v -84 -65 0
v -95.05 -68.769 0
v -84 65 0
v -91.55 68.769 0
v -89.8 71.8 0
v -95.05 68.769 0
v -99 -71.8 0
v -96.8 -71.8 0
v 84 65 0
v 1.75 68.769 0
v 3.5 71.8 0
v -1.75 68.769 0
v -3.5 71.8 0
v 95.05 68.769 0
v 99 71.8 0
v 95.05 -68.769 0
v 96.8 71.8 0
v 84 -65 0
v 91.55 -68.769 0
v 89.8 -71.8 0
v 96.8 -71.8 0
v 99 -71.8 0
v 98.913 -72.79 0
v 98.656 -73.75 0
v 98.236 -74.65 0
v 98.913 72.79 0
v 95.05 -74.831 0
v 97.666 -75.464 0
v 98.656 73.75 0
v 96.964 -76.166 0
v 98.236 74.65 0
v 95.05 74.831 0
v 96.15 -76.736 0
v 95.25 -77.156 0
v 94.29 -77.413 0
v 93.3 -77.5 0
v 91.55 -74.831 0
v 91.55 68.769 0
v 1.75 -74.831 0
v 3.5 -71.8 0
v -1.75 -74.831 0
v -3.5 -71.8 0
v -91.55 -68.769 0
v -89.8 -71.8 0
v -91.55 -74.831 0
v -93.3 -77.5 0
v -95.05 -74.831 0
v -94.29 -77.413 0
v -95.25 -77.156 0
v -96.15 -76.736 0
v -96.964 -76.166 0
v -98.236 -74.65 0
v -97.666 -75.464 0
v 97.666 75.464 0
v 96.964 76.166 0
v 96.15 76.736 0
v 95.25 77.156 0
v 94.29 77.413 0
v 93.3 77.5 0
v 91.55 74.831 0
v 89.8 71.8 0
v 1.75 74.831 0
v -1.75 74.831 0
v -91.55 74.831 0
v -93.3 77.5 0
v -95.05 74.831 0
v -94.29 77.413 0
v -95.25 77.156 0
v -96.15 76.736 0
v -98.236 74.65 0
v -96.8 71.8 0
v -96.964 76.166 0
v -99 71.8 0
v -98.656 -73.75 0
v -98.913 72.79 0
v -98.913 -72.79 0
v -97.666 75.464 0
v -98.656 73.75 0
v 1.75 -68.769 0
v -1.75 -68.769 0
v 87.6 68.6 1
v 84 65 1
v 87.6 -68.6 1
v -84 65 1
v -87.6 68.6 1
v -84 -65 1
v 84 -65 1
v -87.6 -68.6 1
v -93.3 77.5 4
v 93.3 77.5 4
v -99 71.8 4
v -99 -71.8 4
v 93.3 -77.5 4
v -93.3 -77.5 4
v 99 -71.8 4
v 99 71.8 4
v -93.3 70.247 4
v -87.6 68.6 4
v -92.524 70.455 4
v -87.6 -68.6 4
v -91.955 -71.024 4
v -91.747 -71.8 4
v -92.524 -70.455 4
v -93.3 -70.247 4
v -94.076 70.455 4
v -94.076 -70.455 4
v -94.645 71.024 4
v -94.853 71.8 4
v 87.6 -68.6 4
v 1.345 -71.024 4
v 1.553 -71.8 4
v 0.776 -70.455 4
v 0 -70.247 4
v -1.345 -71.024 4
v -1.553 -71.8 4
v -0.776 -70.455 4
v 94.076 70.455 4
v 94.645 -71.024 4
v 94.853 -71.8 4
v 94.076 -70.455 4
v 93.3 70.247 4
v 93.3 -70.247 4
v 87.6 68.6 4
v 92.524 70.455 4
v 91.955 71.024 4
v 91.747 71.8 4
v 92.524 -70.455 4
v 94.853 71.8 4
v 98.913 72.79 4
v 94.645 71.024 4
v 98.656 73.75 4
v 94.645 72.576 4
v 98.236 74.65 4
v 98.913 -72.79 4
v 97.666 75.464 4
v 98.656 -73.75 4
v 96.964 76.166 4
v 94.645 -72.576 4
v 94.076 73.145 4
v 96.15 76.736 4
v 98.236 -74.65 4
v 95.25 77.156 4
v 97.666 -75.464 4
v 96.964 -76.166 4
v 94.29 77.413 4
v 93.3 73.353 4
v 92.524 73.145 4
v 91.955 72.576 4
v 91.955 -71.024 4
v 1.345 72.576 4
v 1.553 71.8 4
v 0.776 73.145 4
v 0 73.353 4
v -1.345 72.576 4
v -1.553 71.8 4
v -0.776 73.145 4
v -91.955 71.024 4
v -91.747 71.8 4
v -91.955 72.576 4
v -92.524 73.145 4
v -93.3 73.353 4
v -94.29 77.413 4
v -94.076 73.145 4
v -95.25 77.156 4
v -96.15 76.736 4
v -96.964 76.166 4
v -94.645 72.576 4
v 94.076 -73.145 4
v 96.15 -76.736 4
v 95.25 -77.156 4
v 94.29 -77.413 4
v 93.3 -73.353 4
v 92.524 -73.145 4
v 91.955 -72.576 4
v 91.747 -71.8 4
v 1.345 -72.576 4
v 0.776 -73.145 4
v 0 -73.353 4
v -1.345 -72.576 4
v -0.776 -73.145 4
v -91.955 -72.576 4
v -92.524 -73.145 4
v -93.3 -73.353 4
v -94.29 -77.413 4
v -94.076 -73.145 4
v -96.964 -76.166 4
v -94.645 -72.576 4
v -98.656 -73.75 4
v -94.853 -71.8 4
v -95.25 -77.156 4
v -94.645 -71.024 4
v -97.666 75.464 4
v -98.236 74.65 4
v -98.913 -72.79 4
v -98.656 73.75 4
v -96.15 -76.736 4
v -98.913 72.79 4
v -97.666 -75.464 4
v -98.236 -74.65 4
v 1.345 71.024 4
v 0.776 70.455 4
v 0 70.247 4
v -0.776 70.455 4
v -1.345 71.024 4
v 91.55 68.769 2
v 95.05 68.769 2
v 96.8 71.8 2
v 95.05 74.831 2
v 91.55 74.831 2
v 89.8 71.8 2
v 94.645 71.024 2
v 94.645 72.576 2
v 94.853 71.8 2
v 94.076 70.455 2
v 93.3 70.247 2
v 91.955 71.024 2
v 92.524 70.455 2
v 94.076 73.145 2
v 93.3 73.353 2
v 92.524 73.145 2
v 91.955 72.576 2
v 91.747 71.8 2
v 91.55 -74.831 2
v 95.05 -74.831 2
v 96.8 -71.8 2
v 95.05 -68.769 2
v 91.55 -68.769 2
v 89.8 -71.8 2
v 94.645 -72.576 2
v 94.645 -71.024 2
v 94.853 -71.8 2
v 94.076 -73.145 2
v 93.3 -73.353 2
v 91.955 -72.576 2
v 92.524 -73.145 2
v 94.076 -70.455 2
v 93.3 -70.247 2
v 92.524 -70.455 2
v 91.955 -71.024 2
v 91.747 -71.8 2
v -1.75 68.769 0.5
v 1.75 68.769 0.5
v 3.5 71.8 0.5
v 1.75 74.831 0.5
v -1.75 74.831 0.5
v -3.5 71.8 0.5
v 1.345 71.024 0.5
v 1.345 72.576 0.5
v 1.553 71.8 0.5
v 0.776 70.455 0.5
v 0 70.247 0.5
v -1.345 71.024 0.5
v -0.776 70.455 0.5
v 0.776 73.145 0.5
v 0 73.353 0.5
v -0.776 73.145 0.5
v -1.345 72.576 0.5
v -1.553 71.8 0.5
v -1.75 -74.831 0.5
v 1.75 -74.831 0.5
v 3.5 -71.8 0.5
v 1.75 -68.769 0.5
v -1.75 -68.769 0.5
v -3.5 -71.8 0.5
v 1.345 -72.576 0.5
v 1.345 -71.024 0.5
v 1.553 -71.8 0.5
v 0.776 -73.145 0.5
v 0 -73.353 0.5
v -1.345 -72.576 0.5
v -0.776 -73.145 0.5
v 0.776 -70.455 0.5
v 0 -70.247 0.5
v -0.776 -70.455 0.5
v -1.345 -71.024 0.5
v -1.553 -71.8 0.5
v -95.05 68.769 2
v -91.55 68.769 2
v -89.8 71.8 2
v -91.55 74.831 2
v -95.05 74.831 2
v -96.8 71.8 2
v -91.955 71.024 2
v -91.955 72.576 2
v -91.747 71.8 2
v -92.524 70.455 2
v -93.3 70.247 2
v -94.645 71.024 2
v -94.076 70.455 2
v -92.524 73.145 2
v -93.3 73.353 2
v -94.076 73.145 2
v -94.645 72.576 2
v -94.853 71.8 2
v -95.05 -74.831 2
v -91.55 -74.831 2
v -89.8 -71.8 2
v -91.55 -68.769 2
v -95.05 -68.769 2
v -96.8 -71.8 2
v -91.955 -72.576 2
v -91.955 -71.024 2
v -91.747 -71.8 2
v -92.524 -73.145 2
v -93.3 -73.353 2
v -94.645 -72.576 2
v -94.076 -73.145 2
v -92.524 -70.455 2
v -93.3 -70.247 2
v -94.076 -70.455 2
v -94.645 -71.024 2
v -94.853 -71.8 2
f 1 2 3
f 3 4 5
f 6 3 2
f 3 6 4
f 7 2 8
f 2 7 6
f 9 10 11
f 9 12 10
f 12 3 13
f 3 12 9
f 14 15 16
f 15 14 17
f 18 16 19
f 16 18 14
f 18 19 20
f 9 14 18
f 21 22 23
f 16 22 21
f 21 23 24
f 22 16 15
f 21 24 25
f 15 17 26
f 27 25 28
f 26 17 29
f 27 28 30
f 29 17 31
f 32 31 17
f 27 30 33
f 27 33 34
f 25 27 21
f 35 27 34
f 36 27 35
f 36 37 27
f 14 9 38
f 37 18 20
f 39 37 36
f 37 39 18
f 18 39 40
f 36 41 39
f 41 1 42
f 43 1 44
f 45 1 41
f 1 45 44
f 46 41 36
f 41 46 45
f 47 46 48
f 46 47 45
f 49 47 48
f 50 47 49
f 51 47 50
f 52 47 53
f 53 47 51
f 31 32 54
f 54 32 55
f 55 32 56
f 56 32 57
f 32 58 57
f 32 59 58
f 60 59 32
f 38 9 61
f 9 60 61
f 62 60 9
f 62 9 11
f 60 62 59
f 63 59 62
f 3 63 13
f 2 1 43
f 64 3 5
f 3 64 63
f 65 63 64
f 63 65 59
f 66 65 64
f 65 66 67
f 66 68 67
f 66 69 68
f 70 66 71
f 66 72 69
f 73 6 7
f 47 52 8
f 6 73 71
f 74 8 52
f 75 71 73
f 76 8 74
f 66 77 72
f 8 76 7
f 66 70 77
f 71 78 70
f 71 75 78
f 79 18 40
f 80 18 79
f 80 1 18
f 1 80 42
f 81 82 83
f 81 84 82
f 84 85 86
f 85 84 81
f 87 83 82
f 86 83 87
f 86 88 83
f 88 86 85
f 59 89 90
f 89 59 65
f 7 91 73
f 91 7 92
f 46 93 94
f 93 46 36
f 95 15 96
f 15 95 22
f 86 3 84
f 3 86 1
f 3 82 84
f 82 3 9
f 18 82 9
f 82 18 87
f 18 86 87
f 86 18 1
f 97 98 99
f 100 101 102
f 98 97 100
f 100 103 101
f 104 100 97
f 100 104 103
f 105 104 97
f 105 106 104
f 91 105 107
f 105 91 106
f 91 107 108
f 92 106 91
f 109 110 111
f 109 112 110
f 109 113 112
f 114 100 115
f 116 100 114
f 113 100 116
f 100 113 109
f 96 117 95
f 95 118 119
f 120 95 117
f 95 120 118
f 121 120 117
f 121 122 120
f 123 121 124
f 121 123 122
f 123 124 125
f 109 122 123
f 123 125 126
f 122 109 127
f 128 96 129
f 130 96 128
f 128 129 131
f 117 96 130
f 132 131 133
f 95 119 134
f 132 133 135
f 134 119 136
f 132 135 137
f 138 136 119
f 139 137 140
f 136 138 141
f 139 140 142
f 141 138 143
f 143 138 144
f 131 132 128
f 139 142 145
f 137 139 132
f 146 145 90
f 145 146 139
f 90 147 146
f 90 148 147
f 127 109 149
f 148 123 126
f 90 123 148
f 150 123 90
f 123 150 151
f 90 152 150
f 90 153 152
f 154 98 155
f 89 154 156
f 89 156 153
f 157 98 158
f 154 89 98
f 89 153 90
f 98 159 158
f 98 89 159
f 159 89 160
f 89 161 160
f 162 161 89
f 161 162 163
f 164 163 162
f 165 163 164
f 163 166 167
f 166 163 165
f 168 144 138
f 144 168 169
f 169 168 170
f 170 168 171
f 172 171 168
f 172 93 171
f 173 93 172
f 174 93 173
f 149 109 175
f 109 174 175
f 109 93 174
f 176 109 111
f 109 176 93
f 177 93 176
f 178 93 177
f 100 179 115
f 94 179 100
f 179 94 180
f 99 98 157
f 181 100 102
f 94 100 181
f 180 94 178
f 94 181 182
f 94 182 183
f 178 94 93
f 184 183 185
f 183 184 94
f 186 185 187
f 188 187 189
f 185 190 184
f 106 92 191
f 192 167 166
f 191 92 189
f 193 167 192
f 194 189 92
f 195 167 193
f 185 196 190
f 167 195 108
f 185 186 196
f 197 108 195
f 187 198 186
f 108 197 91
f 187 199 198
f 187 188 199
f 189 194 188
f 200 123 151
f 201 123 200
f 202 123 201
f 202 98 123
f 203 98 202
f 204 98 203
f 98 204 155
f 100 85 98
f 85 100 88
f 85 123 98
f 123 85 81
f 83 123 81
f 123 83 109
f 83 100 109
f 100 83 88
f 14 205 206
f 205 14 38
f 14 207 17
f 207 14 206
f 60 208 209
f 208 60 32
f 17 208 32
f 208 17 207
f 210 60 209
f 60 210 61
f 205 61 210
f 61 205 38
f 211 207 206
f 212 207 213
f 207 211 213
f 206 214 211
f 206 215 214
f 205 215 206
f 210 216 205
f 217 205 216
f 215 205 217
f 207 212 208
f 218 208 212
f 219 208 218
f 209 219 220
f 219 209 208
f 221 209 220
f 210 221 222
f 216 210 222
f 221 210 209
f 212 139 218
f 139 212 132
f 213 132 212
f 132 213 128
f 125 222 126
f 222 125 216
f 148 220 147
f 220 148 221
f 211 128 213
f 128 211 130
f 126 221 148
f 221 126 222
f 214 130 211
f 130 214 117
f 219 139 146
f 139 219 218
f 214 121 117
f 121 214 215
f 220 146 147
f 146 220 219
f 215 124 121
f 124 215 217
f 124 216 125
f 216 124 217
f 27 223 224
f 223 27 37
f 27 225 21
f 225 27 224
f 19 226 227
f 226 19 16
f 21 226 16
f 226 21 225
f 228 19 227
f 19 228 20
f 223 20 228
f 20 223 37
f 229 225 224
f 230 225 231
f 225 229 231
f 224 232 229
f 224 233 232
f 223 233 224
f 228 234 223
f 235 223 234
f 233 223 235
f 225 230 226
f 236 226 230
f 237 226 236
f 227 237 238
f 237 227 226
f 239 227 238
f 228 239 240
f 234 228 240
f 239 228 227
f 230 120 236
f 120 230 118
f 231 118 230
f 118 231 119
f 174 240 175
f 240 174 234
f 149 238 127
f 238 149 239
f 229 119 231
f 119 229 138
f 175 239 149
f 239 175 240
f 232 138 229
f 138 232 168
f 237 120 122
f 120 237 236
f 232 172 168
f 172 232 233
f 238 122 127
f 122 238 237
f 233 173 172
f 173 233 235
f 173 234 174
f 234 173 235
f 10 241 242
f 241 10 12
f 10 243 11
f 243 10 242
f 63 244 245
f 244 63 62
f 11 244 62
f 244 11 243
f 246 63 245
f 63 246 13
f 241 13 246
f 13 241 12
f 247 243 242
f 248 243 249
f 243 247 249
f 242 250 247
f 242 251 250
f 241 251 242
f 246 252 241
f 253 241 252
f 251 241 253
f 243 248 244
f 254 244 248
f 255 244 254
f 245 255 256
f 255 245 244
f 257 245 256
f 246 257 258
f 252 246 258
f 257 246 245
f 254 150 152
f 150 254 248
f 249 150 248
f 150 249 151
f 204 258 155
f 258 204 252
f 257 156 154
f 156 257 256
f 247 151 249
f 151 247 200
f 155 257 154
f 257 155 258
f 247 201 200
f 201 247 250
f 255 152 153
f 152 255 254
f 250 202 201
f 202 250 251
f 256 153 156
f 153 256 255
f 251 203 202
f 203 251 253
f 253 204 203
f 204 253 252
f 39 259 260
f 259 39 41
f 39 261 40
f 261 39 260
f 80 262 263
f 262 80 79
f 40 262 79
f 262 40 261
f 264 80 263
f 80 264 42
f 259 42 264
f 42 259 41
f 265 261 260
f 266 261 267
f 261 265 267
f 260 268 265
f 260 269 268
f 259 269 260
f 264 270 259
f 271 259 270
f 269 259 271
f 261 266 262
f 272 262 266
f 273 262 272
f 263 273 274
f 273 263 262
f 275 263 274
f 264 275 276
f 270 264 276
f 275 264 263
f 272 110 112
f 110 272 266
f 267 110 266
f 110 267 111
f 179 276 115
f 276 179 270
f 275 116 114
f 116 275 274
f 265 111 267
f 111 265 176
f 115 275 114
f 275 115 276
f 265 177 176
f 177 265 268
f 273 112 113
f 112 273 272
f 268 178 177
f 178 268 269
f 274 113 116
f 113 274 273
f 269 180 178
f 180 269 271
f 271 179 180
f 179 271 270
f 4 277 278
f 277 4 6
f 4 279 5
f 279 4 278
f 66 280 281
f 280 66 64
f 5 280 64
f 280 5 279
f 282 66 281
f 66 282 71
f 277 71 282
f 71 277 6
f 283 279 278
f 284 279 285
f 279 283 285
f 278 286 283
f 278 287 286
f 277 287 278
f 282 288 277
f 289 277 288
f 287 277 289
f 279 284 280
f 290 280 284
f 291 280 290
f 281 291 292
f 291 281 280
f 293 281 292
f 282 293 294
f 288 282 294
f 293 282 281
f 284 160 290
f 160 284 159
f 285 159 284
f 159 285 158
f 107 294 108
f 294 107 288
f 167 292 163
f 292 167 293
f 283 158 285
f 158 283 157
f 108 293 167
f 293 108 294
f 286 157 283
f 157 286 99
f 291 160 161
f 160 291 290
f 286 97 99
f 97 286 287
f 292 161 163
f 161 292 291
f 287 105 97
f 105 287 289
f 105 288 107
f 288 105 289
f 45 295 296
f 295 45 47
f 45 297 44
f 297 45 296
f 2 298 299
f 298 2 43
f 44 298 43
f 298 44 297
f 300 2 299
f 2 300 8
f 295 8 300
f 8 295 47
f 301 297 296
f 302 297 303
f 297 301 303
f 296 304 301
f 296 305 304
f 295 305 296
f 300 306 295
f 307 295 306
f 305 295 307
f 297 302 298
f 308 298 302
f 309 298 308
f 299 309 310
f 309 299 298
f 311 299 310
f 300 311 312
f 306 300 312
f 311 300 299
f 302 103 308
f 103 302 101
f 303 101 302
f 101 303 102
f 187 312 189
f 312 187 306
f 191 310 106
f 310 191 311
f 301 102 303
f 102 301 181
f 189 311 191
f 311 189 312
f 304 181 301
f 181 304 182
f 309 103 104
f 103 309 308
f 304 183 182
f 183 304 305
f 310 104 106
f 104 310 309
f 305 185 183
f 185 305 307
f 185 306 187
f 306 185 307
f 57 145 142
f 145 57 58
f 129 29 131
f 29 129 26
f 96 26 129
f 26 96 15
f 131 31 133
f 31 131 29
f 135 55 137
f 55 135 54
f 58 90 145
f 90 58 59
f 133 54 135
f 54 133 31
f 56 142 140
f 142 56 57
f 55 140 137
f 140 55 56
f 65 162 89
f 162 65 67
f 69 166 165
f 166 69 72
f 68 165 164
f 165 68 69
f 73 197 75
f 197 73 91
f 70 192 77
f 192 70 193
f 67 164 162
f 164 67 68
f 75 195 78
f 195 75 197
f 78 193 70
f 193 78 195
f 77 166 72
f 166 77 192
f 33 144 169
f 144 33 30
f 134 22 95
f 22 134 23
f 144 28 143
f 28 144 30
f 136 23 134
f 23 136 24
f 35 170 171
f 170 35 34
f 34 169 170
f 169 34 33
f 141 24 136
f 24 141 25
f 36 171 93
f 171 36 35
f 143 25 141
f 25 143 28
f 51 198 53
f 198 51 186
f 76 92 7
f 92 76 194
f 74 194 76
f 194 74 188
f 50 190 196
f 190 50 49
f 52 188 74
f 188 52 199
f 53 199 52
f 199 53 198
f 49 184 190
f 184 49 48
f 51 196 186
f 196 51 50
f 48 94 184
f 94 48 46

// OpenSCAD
// PM8535 CRT to LCD screen adaptor
//
//
// an adaptor allowing the use of an LCD screen (default size is for 8 inch HE080IA-01E) in place
//   of the CRT in a Philips PM8535 Logic analyser. 

echo(version=version());

/* [Parts and display] */
// which part to export
part="front"; // [front, back, mounting]
// show facia and screen
show="all"; // [all, parts, none]
// bed width
bed_w = 220;

/* [VDU apature] */
// apature width
apature_w = 180;
// apature height
apature_h = 137;
// apature depth
apature_d = 25;
// amount overlaped behind apature
apature_o = 9;

/* [Mounting points] */
// mounting width
mount_w = 213;
//mounting height
mount_h = 160;
// mounting stud diameter (M4 thread with 7mm nut)
mount_d = 4;
// mounting stud base diameter
mount_base_d = 19;
// mount tab diameter
mount_tab_d = 10;


/* [LCD screen] */
// screen width
screen_w=174;
// screen height
screen_h=136;
// screen depth
screen_d=3;
// additional space between screen and mount
screen_e=0.6; 

/* [mount face] */
// amount the screen is overlapped by a border
face_o=3; 
// depth to LCD screen 
face_d=1; 

module __Customizer_Limit__ () {}


// calculated values
face_o2 = face_o * 2;
apature_o2 = apature_o * 2;
screen_e2 = screen_e * 2;

// standoff radius
standoff_r = ((apature_w + apature_o2) - (screen_w + screen_e2)) / 4;

// fixing bolts location
bolt_x = ((apature_w + apature_o2) / 2) - standoff_r;
bolt_y = ((apature_h + apature_o2) / 2) - standoff_r;
// fixing bolt length
bolt_l = 30;

facia_d = 10; //facia depth
facia_o2 = 20*2; // facia overlap


module cylinder_outer(height,radius,fn) {
   fudge = 1/cos(180/fn);
   cylinder(h=height,r=radius*fudge,$fn=fn);
}
   
module m3_hex_bolt(height) {
    translate([0,0,-0.1]) union() {
        cylinder(h=2.1, r=7/2, $fn=6); // hex head 5mm across flats 2mm high
        translate([0,0,2]) cylinder_outer(height+0.1, 3/2, 12);
    }
}


module bolt_pattern(x,y, l) {
    translate([ x,  y,    0]) m3_hex_bolt(l);
    translate([ x, -y,    0]) m3_hex_bolt(l);
    translate([ 0,  y, -1.5]) m3_hex_bolt(l);
    translate([ 0, -y, -1.5]) m3_hex_bolt(l);
    translate([-x,  y,    0]) m3_hex_bolt(l);
    translate([-x, -y,    0]) m3_hex_bolt(l);    
}

module prism(l, w, h) {
       translate([-l/2, 0, 0])
    polyhedron(
           points=[[0,0,0], [l,0,0], [l,w,0], [0,w,0], [0,0,h], [l,0,h]],
           faces=[[0,1,2,3],[5,4,3,2],[0,4,5,1],[0,3,4],[5,2,1]]
       );
}


module gusset(height, gusset_w, angle) {
    rotate([0,0,angle]) translate([0, gusset_w, 0]) prism(gusset_w, height, height);
}

module standoff(x, y, height, radius, gusset_w, fn) {
    hypot = pythag(2*x, 2*y);
    angle = asin((2*x)/(hypot));

    translate([x, y, 0]) {
        cylinder(h = height, r = radius, $fn=fn);
        if (x>0) {
            gusset(height, gusset_w, 90);
            if (y>0) {
                gusset(height, gusset_w, 180);
                gusset(height, gusset_w, 180-angle);
            } else {
                gusset(height, gusset_w, 0);
                gusset(height, gusset_w, angle);
            }
        } else if (x<0) {
            gusset(height, gusset_w, 270);
            if (y>0) {
                gusset(height, gusset_w, 180);
                gusset(height, gusset_w, 180-angle);
            } else {
                gusset(height, gusset_w, 0);
                gusset(height, gusset_w, angle);
            }
        } else {
            // centre post gussets
            gusset(height, gusset_w, 90);
            gusset(height, gusset_w, 270);
        }   
    }
}

module standoffs(x,y,height, radius, gusset_w, fn) {
    standoff( x,  y,height, radius, gusset_w, fn);
    standoff( x, -y,height, radius, gusset_w, fn);
    standoff( 0,  y,height, radius, gusset_w, fn);
    standoff( 0, -y,height, radius, gusset_w, fn);
    standoff(-x,  y,height, radius, gusset_w, fn);
    standoff(-x, -y,height, radius, gusset_w, fn);
}

module standoff_spacers(x,y,height, radius, fn) {
    translate([x, y, -(height/2)]) cube([radius*2.1,radius*2.1,height],center=true);
    translate([x, -y, -(height/2)]) cube([radius*2.1,radius*2.1,height],center=true);
    translate([-x, y, -(height/2)]) cube([radius*2.1,radius*2.1,height],center=true);
    translate([-x, -y, -(height/2)]) cube([radius*2.1,radius*2.1,height],center=true);
}

module mounting_stud(x, y, height, fn) {
    translate([ x,  y, 0])
        cylinder(h = apature_d - 0.1, r=mount_base_d/2, $fn=fn);
    translate([ x,  y, apature_d-0.1]) 
        cylinder(h = height + 0.1, r=mount_d/2, $fn=fn);
}

module mounting_studs(x,y,height) {
    mounting_stud(x,y, height, 36);
    mounting_stud(-x,y, height, 36);
    mounting_stud(x,-y, height, 36);
    mounting_stud(-x,-y, height, 36);
}

// mounting tab between standoff and mounting stud
// first coordinate is mounting stud, second is standoff
module mounting_tab(x1, y1, tab_r, hole_r, x2, y2, r2, fn) {
    difference() {
        hull() {
          translate([ x1, y1]) circle(r=tab_r, $fn=fn);
          translate([ x2, y2]) circle(r=r2, $fn=fn);
        }
        translate([ x1, y1]) circle(r=hole_r, $fn=fn);
    }
}

module mounting_tabs(x1,y1,tab_r,hole_r, x2,y2,r2, fn) {
    mounting_tab( x1,  y1, tab_r, hole_r,  x2,  y2, r2, fn);
    mounting_tab(-x1,  y1, tab_r, hole_r, -x2,  y2, r2, fn);
    mounting_tab( x1, -y1, tab_r, hole_r,  x2, -y2, r2, fn);
    mounting_tab(-x1, -y1, tab_r, hole_r, -x2, -y2, r2, fn);
}

module ribs(x,y,w,h) {
    translate([ x,  0, h/2]) cube([        w, y * 2 + w, h], center = true);
    translate([-x,  0, h/2]) cube([        w, y * 2 + w, h], center = true);
    translate([ 0,  y, h/2]) cube([x * 2 + w,         w, h], center = true);
    translate([ 0, -y, h/2]) cube([x * 2 + w,         w, h], center = true);
}

module face(h) {
    linear_extrude(height = h)
        difference() {
            square([apature_w + apature_o2, apature_h + apature_o2], center = true);
            square([    screen_w - face_o2, screen_h - face_o2    ], center = true);
        }
}

function pythag(x,y) = sqrt((x*x) + (y*y));

module cross_brace(x,y,r,w,h) {
    hypot = pythag(2*x, 2*y);
    angle = acos((2*x)/(hypot));
    translate([0,0,h/2]) rotate([0,0,angle]) cube([hypot, 2*r, h], center=true);
    translate([0,0,h/2]) rotate([0,0,-angle]) cube([hypot, 2*r, h], center=true);
    translate([0,0,h+h/2]) rotate([0,0,angle]) cube([hypot, w, h], center=true);
    translate([0,0,h+h/2]) rotate([0,0,-angle]) cube([hypot, w, h], center=true);
}

module round_corner(ox,oy,bx,by, corner_h, corner_r) {
    difference() {
    translate([ox,oy,(corner_h/2)]) cube([corner_r*2, corner_r*2,corner_h+0.2], center=true);
    translate([bx,by,(corner_h/2)]) cylinder(h=corner_h+0.2, r=corner_r, center=true,$fn=36);
        
    }
}

module round_corners(ox,oy,bx,by, corner_h, corner_r) {
    round_corner(ox,oy,bx,by, corner_h, corner_r);
    round_corner(-ox,oy,-bx,by, corner_h, corner_r);
    round_corner(ox,-oy,bx,-by, corner_h, corner_r);
    round_corner(-ox,-oy,-bx,-by, corner_h, corner_r);
}

module front() {
    difference() {
        union() {
            face(face_d);
            // around
            translate([ 0,0,face_d])
            linear_extrude(height = screen_d)
            difference() {
                square([(apature_w + apature_o2), (apature_h + apature_o2)], center = true);
                square([screen_w + screen_e2, screen_h + screen_e2], center=true);    
            }
        }
        // bolt holes
        bolt_pattern(bolt_x, bolt_y, bolt_l);
        round_corners((apature_w + apature_o2)/2,
                      (apature_h + apature_o2)/2,
                      bolt_x,
                      bolt_y,
                      face_d+screen_d,
                      standoff_r);  
   }
}



module back() {
    difference() {
        back_h = face_d * 2;
        union() {
            face(back_h);
            cross_brace(bolt_x, bolt_y, standoff_r, face_d, back_h);
            translate([0, 0, back_h]) {
                // outer
                ribs(((apature_w + (apature_o2-face_d))/2),
                     ((apature_h + (apature_o2-face_d))/2),
                     face_d,
                     back_h);
                // center
                ribs(bolt_x,
                     bolt_y,
                     face_d,
                     back_h);
                // inner
                ribs(((screen_w - face_o2 + face_d)/2),
                     ((screen_h - face_o2 + face_d)/2),
                     face_d,
                     back_h);
            
                standoffs(bolt_x,
                      bolt_y,
                      apature_d - (back_h + face_d + screen_d),
                      standoff_r,
                      face_d,
                      36);
                  }
        }    
        // bolt holes
        translate([ 0,0,-(face_d+screen_d)])
            bolt_pattern(bolt_x, bolt_y,bolt_l);
        round_corners((apature_w + apature_o2)/2,
                      (apature_h + apature_o2)/2,
                      bolt_x,
                      bolt_y,
                      back_h*2,
                      standoff_r);      
   }
}

// mounting bracket attaches assembly to existing mount points
module mounting() {
    inner_w = (apature_w + apature_o2) - (standoff_r * 4);
    inner_h = (apature_h + apature_o2) - (standoff_r * 4);
    
    difference() {
        union() {
            linear_extrude(height = (face_d*2))
            difference() {
                union() {
                    square([(apature_w + apature_o2),
                            (apature_h + apature_o2)],
                           center = true);
                    mounting_tabs(mount_w/2,
                                  mount_h/2,
                                  mount_tab_d/2,
                                  (mount_d+1)/2,
                                  bolt_x,
                                  bolt_y,
                                  standoff_r,
                                  18);
                    
                }
                square([inner_w, inner_h], center=true);
            }
            
            translate([0,0,face_d*2]) { 
                //inner
                ribs(((inner_w + face_d)/2),
                     ((inner_h + face_d)/2),
                     face_d,
                     face_d * 2);
                //outer
                ribs(((apature_w + apature_o2-face_d)/2),
                     ((apature_h + apature_o2-face_d)/2),
                     face_d,
                     face_d * 2);
            }
        }
   
        // bolt holes
        translate([ 0,0,-apature_d])
            bolt_pattern(bolt_x, bolt_y, bolt_l);
        translate([ 0,0,-apature_d])
            mounting_studs((mount_w/2), (mount_h/2), 16);
        // clip to bed width
        translate([ (bed_w + 10) / 2, 0, 0])
            cube([10, 200, 10], center=true);
        translate([-(bed_w + 10) / 2, 0, 0])
            cube([10, 200, 10], center=true);
   }
}

// plots placeholder objects for the screen facia and mounting points
module placeholders() {
    //screen placeholder
    translate([0,0,face_d])
        linear_extrude(height = screen_d)
            square([screen_w,screen_h], center=true);
    //facia placeholder
    translate([0,0,-facia_d])
    linear_extrude(height = facia_d)
    difference() {
        square([(apature_w + facia_o2), (apature_h + facia_o2)], center=true);
        square([apature_w, apature_h], center=true);        
    }
    mounting_studs((mount_w/2), (mount_h/2), 16);
}


if (part=="front") {
    front();
} else {
    if (show=="all" || show=="parts") {
        %front();
    }
}

*    translate([0,0,face_d])
        linear_extrude(height = screen_d)
            square([screen_w,screen_h], center=true);

translate([ 0,0,face_d+screen_d])
if (part=="back") {
    back();
} else {
    if (show=="all" || show=="parts") {
        %back();
    }
}

translate([ 0,0,apature_d])
if (part=="mounting") {
    mounting();
} else {
    if (show=="all" || show=="parts") {
        %mounting();
    }
}

if (show=="all") {
    %placeholders();
}
